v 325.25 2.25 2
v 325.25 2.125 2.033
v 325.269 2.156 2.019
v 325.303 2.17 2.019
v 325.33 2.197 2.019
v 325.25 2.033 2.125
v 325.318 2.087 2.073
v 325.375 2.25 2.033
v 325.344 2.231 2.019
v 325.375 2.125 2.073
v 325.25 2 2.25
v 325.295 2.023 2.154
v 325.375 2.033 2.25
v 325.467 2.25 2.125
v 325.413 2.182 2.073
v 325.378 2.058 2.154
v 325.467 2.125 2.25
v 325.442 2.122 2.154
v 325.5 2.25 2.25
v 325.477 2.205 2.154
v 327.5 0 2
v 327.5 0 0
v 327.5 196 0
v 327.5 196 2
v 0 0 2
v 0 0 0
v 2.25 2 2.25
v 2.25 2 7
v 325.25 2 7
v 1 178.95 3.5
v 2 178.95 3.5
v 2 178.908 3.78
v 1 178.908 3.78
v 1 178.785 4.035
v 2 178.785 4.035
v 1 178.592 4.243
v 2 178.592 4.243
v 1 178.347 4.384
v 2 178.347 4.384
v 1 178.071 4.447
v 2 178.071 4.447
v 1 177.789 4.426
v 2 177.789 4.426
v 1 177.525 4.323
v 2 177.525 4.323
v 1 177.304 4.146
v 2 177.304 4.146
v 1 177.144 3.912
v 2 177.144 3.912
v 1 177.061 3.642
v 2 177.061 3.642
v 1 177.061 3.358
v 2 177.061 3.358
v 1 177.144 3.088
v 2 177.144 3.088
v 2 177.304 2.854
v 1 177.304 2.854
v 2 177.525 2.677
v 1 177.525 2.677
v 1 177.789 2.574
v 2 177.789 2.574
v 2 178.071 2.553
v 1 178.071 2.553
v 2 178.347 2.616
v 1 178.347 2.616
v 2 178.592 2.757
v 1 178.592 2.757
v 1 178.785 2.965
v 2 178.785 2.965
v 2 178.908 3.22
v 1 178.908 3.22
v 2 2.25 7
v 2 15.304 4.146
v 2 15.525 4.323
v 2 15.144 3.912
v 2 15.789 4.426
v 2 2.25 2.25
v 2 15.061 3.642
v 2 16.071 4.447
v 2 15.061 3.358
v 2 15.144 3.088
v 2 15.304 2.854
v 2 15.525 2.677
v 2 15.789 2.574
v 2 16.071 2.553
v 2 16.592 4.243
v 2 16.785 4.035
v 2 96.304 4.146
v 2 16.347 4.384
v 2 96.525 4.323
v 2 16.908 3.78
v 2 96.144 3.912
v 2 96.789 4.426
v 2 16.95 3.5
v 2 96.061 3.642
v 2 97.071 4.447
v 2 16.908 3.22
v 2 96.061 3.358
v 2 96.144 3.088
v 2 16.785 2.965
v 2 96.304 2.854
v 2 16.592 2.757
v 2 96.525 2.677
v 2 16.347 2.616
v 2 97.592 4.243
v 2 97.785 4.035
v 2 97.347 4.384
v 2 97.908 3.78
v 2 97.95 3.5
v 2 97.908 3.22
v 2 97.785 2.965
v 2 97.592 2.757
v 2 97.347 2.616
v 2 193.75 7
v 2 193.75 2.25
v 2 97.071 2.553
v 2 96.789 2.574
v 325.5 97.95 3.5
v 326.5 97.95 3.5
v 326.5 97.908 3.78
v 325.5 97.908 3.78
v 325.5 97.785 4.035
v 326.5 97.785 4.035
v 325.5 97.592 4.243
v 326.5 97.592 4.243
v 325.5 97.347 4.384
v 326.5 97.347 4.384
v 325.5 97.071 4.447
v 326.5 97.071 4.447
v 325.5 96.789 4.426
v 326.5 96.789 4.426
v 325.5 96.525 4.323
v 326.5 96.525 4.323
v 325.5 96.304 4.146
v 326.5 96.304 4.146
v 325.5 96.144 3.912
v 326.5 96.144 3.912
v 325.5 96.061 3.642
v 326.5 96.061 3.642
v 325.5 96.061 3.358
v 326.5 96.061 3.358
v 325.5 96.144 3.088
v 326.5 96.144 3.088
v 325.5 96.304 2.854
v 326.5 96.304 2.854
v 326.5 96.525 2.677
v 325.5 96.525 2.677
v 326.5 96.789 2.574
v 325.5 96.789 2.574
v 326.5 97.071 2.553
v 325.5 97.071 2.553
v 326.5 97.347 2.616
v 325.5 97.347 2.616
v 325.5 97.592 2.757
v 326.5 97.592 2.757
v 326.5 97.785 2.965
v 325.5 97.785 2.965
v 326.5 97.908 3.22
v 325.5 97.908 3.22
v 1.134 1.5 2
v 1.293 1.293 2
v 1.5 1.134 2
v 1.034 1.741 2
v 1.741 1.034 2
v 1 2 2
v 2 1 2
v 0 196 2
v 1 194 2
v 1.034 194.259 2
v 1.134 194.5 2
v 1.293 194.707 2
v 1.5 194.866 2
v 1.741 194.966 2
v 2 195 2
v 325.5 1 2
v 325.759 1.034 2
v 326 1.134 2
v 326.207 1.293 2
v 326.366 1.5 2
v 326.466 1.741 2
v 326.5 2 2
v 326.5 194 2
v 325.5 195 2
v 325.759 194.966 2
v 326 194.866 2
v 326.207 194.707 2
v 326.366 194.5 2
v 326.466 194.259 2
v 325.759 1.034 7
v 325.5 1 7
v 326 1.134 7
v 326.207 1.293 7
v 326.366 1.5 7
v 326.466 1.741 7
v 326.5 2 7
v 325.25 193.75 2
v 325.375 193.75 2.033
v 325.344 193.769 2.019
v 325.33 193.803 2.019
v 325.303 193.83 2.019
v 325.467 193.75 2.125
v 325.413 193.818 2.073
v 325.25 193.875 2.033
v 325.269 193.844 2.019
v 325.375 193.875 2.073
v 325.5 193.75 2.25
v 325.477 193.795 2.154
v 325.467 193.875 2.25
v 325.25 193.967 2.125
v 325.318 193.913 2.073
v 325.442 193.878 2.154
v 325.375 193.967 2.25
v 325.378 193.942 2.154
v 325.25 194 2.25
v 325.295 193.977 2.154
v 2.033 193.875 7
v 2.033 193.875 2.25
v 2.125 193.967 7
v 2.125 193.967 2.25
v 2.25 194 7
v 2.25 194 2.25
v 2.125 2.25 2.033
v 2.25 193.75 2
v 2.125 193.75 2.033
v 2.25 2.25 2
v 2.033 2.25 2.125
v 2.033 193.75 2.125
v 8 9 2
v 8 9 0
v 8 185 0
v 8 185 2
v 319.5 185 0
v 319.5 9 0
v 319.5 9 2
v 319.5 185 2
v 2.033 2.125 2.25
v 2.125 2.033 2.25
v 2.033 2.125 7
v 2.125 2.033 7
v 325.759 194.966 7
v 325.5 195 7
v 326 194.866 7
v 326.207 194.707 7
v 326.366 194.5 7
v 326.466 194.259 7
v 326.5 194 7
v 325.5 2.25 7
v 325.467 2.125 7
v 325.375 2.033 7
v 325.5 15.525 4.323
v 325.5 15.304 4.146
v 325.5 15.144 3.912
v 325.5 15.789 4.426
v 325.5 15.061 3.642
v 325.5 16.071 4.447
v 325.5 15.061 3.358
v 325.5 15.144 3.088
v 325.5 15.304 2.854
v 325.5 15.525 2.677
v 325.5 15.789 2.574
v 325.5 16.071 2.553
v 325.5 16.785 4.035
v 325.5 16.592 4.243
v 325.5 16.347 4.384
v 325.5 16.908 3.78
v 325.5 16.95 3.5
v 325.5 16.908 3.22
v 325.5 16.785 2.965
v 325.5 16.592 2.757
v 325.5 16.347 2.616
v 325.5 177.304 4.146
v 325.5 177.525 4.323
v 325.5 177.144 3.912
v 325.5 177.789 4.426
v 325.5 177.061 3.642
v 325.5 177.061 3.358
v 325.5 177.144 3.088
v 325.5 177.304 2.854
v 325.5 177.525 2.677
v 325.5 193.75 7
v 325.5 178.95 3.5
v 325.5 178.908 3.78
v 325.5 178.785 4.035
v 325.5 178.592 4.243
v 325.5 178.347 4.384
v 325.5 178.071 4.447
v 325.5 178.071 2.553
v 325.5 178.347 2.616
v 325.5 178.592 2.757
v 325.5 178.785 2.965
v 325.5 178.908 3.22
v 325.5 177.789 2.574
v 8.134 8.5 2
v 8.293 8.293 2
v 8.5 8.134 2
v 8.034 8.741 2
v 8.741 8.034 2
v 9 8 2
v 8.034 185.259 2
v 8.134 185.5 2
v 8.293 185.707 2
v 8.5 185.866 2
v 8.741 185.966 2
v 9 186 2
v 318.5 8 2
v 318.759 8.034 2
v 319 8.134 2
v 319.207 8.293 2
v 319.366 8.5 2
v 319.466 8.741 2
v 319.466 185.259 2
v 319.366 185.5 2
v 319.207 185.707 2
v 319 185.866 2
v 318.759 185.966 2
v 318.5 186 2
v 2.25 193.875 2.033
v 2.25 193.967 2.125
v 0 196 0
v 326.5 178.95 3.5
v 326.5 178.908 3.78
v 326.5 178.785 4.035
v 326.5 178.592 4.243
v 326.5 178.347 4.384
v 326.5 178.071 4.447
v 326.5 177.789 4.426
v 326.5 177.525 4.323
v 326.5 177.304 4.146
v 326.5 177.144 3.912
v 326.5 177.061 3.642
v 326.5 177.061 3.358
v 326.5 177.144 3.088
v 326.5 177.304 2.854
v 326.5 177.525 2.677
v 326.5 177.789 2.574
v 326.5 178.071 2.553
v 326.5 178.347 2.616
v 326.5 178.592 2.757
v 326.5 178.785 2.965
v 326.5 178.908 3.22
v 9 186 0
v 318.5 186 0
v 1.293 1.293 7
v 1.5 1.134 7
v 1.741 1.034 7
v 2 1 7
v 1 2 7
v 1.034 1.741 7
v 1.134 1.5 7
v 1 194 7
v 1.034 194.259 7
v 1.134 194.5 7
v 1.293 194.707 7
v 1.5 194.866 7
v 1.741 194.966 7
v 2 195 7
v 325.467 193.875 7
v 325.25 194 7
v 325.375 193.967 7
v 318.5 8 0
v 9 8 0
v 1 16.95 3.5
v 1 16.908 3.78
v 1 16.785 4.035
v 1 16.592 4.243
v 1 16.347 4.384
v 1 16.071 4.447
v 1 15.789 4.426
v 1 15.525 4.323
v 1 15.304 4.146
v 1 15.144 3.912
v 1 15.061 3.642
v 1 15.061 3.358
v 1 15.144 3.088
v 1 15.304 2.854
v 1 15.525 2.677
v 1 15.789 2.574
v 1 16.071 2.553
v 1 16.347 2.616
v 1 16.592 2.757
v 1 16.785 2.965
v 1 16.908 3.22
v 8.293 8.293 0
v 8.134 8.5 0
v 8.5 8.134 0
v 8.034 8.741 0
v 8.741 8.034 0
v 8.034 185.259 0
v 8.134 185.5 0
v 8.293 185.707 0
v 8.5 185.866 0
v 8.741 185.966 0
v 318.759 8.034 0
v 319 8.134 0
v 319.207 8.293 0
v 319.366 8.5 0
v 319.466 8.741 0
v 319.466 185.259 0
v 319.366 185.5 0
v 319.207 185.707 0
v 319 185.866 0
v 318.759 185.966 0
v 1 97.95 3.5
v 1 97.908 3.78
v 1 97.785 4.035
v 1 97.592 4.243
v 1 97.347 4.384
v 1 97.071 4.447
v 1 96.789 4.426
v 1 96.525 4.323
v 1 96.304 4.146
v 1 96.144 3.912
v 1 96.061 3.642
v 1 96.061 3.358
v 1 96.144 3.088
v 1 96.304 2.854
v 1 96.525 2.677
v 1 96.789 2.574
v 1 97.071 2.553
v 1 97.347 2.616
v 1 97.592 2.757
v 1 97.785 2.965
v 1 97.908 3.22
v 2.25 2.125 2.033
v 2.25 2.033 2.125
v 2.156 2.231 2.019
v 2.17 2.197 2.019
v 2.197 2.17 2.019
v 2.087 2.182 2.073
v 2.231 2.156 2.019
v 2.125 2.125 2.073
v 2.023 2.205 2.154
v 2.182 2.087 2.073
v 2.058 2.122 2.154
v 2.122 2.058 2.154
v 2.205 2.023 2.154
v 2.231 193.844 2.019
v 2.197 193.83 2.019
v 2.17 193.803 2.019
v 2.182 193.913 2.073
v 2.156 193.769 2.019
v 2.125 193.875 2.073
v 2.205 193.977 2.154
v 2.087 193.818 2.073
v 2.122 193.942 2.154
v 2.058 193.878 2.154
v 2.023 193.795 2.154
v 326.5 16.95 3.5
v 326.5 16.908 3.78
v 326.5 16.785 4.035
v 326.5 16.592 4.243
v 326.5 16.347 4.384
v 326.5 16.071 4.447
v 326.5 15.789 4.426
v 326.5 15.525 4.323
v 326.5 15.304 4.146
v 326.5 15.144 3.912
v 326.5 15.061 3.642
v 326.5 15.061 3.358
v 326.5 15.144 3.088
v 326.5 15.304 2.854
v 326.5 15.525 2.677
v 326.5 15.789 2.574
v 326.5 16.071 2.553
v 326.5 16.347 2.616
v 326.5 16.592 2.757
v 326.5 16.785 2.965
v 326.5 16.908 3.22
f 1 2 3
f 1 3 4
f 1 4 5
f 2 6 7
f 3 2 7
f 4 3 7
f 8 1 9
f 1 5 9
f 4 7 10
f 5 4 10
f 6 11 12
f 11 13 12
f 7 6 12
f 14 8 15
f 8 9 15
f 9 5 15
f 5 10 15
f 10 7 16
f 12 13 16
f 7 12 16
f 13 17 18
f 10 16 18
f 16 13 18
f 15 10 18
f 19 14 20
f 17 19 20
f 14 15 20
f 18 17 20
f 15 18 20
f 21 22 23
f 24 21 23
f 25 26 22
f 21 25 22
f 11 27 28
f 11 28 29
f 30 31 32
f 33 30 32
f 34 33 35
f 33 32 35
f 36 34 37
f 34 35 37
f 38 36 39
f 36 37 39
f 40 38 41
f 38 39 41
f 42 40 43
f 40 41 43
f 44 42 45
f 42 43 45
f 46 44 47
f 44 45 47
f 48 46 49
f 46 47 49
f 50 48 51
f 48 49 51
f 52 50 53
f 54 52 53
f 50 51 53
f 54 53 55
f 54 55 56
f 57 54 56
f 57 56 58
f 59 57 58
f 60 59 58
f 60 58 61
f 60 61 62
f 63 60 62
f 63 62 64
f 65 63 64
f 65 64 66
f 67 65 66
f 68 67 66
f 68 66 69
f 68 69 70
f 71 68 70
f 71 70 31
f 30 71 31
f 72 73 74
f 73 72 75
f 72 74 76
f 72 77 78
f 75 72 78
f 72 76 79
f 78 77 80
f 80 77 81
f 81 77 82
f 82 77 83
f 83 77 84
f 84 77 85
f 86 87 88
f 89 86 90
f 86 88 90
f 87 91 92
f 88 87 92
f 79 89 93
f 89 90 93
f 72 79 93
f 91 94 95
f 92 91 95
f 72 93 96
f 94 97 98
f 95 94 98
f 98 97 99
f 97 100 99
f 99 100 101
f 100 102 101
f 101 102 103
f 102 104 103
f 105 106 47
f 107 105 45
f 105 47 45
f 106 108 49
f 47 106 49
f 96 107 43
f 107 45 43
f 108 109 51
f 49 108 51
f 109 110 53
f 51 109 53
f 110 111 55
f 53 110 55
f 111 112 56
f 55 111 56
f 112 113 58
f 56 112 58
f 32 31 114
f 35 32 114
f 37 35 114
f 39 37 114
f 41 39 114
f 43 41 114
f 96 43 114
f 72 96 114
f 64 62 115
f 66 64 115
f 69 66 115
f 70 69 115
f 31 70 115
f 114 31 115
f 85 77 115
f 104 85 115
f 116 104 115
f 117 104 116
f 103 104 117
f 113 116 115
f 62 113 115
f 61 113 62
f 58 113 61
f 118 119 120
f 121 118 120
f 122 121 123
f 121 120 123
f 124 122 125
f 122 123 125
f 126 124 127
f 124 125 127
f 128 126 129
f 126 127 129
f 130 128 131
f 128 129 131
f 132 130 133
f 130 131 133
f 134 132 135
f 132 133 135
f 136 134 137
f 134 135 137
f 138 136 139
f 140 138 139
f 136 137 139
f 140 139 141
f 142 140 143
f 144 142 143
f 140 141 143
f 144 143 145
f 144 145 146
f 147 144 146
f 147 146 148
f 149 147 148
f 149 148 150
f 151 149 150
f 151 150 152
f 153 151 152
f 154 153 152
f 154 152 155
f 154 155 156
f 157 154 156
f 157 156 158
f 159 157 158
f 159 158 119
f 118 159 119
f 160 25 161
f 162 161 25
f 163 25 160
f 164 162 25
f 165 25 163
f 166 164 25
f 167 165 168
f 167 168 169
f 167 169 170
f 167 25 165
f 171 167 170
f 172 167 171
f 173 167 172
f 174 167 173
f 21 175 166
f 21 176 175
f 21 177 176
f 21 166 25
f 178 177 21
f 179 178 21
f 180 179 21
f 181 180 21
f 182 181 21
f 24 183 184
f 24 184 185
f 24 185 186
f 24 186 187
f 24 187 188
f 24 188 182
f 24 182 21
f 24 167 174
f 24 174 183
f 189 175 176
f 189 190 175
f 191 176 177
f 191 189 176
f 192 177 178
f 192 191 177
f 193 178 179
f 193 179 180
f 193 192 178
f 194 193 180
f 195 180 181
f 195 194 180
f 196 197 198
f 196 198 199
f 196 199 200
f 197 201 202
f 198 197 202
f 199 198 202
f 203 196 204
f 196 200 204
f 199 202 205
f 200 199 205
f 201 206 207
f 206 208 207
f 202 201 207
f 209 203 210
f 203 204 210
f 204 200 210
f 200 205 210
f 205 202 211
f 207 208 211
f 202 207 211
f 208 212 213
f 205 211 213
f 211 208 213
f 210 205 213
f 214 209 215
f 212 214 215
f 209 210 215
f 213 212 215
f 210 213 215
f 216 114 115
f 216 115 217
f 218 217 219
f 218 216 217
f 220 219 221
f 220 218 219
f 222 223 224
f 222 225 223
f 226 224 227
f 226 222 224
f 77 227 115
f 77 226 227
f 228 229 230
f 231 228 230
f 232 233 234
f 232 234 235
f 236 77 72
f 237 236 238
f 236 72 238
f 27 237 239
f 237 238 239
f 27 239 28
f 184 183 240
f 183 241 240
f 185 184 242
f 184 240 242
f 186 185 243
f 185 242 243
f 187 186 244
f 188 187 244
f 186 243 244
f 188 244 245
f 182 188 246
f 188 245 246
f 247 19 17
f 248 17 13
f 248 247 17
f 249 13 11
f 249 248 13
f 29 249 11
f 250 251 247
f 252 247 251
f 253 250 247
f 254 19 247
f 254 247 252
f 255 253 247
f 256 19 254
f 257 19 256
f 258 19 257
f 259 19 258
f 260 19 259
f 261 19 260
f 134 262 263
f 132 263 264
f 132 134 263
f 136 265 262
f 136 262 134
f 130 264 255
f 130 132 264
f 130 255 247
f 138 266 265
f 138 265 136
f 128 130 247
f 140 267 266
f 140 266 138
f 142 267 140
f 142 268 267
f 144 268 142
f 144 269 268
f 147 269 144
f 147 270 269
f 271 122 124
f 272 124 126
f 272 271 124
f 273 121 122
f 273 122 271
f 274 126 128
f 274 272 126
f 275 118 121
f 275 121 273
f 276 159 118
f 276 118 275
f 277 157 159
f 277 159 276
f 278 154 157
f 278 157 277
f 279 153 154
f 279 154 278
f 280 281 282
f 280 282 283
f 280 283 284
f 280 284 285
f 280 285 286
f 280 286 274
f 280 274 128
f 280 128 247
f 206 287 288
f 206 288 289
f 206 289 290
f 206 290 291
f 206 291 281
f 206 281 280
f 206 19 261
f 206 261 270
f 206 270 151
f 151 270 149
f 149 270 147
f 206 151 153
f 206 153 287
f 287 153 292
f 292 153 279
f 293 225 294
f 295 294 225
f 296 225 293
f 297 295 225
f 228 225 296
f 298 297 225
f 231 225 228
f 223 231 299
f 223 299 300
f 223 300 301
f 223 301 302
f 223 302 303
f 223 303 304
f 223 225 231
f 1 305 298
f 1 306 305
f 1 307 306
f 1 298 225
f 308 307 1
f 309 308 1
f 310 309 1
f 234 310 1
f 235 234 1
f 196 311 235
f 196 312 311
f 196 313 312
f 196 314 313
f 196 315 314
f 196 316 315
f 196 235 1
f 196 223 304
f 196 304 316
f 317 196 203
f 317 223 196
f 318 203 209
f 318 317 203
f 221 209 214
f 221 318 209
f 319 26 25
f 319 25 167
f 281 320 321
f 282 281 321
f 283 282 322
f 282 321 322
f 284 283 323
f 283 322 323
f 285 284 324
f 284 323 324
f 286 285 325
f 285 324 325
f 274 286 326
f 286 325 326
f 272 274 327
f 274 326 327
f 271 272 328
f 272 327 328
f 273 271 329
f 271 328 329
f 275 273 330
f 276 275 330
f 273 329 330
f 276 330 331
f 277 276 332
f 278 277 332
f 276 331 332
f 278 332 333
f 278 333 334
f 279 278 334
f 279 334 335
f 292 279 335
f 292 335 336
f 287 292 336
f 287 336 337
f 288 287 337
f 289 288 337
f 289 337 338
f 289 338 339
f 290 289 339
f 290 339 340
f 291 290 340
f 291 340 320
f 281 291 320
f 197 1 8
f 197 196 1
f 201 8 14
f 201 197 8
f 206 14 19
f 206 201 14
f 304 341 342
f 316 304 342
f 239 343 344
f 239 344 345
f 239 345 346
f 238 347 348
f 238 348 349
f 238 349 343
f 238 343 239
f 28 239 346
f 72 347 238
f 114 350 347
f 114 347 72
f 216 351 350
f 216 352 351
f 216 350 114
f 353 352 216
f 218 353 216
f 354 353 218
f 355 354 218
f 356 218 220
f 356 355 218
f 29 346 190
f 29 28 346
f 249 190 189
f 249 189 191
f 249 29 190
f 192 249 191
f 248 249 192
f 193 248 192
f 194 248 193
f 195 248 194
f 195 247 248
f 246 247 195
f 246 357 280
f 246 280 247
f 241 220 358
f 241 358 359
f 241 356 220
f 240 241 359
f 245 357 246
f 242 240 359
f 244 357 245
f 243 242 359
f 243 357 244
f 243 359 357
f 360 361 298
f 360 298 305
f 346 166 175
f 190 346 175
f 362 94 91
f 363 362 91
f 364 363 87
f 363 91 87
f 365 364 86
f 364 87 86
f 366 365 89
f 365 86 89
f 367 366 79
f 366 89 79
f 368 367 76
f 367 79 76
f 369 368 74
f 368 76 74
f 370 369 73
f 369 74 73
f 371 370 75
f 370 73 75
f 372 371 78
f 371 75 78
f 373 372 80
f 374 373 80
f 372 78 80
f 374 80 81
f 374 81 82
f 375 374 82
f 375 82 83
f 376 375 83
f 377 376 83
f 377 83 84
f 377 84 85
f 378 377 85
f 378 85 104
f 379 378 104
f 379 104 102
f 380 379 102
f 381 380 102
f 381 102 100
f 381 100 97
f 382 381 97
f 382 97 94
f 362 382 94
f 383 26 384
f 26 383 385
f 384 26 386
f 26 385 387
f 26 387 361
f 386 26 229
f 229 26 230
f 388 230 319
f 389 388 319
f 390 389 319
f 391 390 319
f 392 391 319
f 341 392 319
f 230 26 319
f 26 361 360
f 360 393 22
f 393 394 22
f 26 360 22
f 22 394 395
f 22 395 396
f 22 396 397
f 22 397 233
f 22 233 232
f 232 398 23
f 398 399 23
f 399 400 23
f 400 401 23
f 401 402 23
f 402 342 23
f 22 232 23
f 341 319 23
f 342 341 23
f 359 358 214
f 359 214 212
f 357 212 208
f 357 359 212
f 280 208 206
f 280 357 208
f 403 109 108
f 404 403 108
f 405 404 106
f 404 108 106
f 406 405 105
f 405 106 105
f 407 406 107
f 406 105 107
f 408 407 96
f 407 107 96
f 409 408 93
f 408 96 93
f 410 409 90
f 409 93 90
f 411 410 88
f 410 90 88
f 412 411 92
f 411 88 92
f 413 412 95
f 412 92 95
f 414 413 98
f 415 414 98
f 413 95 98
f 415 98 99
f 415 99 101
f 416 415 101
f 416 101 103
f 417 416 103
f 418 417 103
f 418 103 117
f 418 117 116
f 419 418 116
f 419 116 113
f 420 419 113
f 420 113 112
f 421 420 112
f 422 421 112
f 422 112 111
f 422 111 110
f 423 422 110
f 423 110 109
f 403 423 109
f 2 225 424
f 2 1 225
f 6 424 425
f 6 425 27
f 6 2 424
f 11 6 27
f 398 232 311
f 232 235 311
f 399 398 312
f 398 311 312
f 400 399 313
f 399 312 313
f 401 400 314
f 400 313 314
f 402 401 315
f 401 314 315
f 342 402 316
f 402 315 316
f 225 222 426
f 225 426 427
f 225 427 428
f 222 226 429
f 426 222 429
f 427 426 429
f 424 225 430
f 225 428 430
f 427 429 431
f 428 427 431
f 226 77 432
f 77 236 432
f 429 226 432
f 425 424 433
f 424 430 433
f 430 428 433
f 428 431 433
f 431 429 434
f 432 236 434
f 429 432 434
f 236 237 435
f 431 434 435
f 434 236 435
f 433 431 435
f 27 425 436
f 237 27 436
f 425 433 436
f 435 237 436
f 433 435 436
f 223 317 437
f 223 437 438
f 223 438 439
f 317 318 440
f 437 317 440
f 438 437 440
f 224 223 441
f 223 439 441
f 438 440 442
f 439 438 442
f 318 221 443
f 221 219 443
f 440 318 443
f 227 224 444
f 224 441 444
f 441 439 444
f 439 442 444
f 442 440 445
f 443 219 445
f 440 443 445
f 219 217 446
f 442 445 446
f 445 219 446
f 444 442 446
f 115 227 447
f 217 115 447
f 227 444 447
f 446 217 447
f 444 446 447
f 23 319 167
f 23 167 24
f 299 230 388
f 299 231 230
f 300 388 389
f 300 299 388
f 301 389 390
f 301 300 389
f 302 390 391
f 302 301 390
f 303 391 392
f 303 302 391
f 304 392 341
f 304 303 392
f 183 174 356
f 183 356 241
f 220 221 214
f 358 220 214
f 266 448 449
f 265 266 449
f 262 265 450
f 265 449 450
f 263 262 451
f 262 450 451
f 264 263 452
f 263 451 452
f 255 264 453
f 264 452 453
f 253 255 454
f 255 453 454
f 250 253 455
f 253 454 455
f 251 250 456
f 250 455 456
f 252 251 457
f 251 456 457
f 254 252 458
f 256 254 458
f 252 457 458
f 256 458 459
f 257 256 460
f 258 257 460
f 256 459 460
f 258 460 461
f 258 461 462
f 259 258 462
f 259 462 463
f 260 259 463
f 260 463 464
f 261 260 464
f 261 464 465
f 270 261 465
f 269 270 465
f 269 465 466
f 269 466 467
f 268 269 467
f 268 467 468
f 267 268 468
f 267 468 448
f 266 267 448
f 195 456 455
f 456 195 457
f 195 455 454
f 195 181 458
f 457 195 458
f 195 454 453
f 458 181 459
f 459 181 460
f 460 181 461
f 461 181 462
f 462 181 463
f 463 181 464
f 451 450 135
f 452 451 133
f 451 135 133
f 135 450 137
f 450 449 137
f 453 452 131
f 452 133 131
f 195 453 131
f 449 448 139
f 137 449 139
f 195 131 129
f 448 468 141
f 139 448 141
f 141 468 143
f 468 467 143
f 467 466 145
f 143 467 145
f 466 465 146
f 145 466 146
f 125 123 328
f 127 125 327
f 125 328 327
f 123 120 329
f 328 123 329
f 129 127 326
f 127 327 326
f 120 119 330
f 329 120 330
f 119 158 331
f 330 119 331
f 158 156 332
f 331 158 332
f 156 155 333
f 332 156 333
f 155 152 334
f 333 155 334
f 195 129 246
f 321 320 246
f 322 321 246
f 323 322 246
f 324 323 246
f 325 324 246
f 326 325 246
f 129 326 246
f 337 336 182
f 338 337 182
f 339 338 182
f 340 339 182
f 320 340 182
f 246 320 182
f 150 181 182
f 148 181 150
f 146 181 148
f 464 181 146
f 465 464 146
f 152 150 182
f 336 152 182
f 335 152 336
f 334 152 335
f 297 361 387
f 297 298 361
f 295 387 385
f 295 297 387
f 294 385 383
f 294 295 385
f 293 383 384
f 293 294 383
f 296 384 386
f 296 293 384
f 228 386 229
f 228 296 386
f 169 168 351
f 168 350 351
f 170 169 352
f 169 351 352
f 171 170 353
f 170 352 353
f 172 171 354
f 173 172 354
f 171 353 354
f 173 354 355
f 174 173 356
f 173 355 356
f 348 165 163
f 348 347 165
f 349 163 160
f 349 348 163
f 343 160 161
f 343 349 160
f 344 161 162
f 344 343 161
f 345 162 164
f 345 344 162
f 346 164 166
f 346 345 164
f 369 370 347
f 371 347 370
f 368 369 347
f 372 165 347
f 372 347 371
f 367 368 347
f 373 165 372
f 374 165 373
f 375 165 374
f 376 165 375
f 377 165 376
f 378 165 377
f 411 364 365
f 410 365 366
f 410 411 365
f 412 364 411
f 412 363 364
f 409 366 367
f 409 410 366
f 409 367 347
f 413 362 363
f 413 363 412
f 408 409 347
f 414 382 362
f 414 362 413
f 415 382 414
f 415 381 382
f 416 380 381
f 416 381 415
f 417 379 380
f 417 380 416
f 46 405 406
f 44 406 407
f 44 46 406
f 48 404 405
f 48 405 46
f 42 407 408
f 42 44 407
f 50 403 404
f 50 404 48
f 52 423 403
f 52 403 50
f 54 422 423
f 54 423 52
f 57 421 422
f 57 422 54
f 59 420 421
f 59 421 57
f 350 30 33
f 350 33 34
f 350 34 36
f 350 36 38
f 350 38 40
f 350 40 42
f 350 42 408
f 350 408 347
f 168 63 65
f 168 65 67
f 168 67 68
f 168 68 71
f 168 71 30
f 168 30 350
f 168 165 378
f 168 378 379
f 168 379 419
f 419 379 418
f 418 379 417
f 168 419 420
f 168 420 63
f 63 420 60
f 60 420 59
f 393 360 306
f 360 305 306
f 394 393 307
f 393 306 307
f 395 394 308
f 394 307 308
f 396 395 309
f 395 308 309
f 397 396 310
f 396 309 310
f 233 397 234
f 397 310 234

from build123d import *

# Parameters (mm, degrees)
SKETCH_W            = 327.5
SKETCH_H            = 196
SKETCH_W_2          = 311.5
SKETCH_H_2          = 178
PAD_DEPTH           = 2
SKETCH002_W         = 325.5
SKETCH002_H         = 194
SKETCH002_W_2       = 323.5
SKETCH002_H_2       = 192
PAD001_DEPTH        = 5
SKETCH005_R         = 0.95
POCKET_DEPTH        = 326.501
LINEARPATTERN_COUNT = 3
LINEARPATTERN_PITCH = 81
FILLET_R            = 0.25
FILLET001_R         = 1
FILLET002_R         = 0.25
FILLET003_R         = 1


with BuildPart() as part:
    # Sketch → Pad (new body)
    with BuildSketch(Plane.XY):
        with Locations((163.75, 98)):
            Rectangle(SKETCH_W, SKETCH_H)
        with Locations((163.75, 97)):
            Rectangle(SKETCH_W_2, SKETCH_H_2, mode=Mode.SUBTRACT)
    extrude(amount=PAD_DEPTH)

    # Sketch002 (on Face10 of Pad) → Pad001 (join)
    with BuildSketch(Plane.XY.offset(2)):
        with Locations((163.75, 98)):
            Rectangle(SKETCH002_W, SKETCH002_H)
        with Locations((163.75, 98)):
            Rectangle(SKETCH002_W_2, SKETCH002_H_2, mode=Mode.SUBTRACT)
    extrude(amount=PAD001_DEPTH)

    # Sketch005 (on Face12 of Pad001) → Pocket (cut, through all)
    with BuildSketch(Plane.YZ.offset(326.5)):
        with Locations((16, 3.5)):
            Circle(SKETCH005_R)
    pocket = extrude(amount=-POCKET_DEPTH, mode=Mode.SUBTRACT)

    # LinearPattern: Pocket ×3
    with Locations(*[(0, i * LINEARPATTERN_PITCH, 0) for i in range(1, LINEARPATTERN_COUNT)]):
        add(pocket, mode=Mode.SUBTRACT)

    # Fillet
    fillet_edges = [part.edges().sort_by_distance(p)[0] for p in [
        (2, 194, 4.5),
        (2, 2, 4.5),
        (325.5, 2, 4.5),
        (325.5, 194, 4.5),
    ]]
    fillet(fillet_edges, radius=FILLET_R)

    # Fillet001
    fillet001_edges = [part.edges().sort_by_distance(p)[0] for p in [
        (319.5, 186, 1),
        (319.5, 8, 1),
        (8, 186, 1),
        (8, 8, 1),
    ]]
    fillet(fillet001_edges, radius=FILLET001_R)

    # Fillet002
    fillet002_edges = [part.edges().sort_by_distance(p)[0] for p in [
        (163.75, 2, 2),
        (325.5, 98, 2),
        (163.75, 194, 2),
        (2, 98, 2),
        (2.073223, 193.926777, 2),
        (2.073223, 2.073223, 2),
        (325.426777, 2.073223, 2),
        (325.426777, 193.926777, 2),
    ]]
    fillet(fillet002_edges, radius=FILLET002_R)

    # Fillet003
    fillet003_edges = [part.edges().sort_by_distance(p)[0] for p in [
        (326.5, 1, 4.5),
        (326.5, 195, 4.5),
        (1, 1, 4.5),
        (1, 195, 4.5),
    ]]
    fillet(fillet003_edges, radius=FILLET003_R)


solid = part.part
